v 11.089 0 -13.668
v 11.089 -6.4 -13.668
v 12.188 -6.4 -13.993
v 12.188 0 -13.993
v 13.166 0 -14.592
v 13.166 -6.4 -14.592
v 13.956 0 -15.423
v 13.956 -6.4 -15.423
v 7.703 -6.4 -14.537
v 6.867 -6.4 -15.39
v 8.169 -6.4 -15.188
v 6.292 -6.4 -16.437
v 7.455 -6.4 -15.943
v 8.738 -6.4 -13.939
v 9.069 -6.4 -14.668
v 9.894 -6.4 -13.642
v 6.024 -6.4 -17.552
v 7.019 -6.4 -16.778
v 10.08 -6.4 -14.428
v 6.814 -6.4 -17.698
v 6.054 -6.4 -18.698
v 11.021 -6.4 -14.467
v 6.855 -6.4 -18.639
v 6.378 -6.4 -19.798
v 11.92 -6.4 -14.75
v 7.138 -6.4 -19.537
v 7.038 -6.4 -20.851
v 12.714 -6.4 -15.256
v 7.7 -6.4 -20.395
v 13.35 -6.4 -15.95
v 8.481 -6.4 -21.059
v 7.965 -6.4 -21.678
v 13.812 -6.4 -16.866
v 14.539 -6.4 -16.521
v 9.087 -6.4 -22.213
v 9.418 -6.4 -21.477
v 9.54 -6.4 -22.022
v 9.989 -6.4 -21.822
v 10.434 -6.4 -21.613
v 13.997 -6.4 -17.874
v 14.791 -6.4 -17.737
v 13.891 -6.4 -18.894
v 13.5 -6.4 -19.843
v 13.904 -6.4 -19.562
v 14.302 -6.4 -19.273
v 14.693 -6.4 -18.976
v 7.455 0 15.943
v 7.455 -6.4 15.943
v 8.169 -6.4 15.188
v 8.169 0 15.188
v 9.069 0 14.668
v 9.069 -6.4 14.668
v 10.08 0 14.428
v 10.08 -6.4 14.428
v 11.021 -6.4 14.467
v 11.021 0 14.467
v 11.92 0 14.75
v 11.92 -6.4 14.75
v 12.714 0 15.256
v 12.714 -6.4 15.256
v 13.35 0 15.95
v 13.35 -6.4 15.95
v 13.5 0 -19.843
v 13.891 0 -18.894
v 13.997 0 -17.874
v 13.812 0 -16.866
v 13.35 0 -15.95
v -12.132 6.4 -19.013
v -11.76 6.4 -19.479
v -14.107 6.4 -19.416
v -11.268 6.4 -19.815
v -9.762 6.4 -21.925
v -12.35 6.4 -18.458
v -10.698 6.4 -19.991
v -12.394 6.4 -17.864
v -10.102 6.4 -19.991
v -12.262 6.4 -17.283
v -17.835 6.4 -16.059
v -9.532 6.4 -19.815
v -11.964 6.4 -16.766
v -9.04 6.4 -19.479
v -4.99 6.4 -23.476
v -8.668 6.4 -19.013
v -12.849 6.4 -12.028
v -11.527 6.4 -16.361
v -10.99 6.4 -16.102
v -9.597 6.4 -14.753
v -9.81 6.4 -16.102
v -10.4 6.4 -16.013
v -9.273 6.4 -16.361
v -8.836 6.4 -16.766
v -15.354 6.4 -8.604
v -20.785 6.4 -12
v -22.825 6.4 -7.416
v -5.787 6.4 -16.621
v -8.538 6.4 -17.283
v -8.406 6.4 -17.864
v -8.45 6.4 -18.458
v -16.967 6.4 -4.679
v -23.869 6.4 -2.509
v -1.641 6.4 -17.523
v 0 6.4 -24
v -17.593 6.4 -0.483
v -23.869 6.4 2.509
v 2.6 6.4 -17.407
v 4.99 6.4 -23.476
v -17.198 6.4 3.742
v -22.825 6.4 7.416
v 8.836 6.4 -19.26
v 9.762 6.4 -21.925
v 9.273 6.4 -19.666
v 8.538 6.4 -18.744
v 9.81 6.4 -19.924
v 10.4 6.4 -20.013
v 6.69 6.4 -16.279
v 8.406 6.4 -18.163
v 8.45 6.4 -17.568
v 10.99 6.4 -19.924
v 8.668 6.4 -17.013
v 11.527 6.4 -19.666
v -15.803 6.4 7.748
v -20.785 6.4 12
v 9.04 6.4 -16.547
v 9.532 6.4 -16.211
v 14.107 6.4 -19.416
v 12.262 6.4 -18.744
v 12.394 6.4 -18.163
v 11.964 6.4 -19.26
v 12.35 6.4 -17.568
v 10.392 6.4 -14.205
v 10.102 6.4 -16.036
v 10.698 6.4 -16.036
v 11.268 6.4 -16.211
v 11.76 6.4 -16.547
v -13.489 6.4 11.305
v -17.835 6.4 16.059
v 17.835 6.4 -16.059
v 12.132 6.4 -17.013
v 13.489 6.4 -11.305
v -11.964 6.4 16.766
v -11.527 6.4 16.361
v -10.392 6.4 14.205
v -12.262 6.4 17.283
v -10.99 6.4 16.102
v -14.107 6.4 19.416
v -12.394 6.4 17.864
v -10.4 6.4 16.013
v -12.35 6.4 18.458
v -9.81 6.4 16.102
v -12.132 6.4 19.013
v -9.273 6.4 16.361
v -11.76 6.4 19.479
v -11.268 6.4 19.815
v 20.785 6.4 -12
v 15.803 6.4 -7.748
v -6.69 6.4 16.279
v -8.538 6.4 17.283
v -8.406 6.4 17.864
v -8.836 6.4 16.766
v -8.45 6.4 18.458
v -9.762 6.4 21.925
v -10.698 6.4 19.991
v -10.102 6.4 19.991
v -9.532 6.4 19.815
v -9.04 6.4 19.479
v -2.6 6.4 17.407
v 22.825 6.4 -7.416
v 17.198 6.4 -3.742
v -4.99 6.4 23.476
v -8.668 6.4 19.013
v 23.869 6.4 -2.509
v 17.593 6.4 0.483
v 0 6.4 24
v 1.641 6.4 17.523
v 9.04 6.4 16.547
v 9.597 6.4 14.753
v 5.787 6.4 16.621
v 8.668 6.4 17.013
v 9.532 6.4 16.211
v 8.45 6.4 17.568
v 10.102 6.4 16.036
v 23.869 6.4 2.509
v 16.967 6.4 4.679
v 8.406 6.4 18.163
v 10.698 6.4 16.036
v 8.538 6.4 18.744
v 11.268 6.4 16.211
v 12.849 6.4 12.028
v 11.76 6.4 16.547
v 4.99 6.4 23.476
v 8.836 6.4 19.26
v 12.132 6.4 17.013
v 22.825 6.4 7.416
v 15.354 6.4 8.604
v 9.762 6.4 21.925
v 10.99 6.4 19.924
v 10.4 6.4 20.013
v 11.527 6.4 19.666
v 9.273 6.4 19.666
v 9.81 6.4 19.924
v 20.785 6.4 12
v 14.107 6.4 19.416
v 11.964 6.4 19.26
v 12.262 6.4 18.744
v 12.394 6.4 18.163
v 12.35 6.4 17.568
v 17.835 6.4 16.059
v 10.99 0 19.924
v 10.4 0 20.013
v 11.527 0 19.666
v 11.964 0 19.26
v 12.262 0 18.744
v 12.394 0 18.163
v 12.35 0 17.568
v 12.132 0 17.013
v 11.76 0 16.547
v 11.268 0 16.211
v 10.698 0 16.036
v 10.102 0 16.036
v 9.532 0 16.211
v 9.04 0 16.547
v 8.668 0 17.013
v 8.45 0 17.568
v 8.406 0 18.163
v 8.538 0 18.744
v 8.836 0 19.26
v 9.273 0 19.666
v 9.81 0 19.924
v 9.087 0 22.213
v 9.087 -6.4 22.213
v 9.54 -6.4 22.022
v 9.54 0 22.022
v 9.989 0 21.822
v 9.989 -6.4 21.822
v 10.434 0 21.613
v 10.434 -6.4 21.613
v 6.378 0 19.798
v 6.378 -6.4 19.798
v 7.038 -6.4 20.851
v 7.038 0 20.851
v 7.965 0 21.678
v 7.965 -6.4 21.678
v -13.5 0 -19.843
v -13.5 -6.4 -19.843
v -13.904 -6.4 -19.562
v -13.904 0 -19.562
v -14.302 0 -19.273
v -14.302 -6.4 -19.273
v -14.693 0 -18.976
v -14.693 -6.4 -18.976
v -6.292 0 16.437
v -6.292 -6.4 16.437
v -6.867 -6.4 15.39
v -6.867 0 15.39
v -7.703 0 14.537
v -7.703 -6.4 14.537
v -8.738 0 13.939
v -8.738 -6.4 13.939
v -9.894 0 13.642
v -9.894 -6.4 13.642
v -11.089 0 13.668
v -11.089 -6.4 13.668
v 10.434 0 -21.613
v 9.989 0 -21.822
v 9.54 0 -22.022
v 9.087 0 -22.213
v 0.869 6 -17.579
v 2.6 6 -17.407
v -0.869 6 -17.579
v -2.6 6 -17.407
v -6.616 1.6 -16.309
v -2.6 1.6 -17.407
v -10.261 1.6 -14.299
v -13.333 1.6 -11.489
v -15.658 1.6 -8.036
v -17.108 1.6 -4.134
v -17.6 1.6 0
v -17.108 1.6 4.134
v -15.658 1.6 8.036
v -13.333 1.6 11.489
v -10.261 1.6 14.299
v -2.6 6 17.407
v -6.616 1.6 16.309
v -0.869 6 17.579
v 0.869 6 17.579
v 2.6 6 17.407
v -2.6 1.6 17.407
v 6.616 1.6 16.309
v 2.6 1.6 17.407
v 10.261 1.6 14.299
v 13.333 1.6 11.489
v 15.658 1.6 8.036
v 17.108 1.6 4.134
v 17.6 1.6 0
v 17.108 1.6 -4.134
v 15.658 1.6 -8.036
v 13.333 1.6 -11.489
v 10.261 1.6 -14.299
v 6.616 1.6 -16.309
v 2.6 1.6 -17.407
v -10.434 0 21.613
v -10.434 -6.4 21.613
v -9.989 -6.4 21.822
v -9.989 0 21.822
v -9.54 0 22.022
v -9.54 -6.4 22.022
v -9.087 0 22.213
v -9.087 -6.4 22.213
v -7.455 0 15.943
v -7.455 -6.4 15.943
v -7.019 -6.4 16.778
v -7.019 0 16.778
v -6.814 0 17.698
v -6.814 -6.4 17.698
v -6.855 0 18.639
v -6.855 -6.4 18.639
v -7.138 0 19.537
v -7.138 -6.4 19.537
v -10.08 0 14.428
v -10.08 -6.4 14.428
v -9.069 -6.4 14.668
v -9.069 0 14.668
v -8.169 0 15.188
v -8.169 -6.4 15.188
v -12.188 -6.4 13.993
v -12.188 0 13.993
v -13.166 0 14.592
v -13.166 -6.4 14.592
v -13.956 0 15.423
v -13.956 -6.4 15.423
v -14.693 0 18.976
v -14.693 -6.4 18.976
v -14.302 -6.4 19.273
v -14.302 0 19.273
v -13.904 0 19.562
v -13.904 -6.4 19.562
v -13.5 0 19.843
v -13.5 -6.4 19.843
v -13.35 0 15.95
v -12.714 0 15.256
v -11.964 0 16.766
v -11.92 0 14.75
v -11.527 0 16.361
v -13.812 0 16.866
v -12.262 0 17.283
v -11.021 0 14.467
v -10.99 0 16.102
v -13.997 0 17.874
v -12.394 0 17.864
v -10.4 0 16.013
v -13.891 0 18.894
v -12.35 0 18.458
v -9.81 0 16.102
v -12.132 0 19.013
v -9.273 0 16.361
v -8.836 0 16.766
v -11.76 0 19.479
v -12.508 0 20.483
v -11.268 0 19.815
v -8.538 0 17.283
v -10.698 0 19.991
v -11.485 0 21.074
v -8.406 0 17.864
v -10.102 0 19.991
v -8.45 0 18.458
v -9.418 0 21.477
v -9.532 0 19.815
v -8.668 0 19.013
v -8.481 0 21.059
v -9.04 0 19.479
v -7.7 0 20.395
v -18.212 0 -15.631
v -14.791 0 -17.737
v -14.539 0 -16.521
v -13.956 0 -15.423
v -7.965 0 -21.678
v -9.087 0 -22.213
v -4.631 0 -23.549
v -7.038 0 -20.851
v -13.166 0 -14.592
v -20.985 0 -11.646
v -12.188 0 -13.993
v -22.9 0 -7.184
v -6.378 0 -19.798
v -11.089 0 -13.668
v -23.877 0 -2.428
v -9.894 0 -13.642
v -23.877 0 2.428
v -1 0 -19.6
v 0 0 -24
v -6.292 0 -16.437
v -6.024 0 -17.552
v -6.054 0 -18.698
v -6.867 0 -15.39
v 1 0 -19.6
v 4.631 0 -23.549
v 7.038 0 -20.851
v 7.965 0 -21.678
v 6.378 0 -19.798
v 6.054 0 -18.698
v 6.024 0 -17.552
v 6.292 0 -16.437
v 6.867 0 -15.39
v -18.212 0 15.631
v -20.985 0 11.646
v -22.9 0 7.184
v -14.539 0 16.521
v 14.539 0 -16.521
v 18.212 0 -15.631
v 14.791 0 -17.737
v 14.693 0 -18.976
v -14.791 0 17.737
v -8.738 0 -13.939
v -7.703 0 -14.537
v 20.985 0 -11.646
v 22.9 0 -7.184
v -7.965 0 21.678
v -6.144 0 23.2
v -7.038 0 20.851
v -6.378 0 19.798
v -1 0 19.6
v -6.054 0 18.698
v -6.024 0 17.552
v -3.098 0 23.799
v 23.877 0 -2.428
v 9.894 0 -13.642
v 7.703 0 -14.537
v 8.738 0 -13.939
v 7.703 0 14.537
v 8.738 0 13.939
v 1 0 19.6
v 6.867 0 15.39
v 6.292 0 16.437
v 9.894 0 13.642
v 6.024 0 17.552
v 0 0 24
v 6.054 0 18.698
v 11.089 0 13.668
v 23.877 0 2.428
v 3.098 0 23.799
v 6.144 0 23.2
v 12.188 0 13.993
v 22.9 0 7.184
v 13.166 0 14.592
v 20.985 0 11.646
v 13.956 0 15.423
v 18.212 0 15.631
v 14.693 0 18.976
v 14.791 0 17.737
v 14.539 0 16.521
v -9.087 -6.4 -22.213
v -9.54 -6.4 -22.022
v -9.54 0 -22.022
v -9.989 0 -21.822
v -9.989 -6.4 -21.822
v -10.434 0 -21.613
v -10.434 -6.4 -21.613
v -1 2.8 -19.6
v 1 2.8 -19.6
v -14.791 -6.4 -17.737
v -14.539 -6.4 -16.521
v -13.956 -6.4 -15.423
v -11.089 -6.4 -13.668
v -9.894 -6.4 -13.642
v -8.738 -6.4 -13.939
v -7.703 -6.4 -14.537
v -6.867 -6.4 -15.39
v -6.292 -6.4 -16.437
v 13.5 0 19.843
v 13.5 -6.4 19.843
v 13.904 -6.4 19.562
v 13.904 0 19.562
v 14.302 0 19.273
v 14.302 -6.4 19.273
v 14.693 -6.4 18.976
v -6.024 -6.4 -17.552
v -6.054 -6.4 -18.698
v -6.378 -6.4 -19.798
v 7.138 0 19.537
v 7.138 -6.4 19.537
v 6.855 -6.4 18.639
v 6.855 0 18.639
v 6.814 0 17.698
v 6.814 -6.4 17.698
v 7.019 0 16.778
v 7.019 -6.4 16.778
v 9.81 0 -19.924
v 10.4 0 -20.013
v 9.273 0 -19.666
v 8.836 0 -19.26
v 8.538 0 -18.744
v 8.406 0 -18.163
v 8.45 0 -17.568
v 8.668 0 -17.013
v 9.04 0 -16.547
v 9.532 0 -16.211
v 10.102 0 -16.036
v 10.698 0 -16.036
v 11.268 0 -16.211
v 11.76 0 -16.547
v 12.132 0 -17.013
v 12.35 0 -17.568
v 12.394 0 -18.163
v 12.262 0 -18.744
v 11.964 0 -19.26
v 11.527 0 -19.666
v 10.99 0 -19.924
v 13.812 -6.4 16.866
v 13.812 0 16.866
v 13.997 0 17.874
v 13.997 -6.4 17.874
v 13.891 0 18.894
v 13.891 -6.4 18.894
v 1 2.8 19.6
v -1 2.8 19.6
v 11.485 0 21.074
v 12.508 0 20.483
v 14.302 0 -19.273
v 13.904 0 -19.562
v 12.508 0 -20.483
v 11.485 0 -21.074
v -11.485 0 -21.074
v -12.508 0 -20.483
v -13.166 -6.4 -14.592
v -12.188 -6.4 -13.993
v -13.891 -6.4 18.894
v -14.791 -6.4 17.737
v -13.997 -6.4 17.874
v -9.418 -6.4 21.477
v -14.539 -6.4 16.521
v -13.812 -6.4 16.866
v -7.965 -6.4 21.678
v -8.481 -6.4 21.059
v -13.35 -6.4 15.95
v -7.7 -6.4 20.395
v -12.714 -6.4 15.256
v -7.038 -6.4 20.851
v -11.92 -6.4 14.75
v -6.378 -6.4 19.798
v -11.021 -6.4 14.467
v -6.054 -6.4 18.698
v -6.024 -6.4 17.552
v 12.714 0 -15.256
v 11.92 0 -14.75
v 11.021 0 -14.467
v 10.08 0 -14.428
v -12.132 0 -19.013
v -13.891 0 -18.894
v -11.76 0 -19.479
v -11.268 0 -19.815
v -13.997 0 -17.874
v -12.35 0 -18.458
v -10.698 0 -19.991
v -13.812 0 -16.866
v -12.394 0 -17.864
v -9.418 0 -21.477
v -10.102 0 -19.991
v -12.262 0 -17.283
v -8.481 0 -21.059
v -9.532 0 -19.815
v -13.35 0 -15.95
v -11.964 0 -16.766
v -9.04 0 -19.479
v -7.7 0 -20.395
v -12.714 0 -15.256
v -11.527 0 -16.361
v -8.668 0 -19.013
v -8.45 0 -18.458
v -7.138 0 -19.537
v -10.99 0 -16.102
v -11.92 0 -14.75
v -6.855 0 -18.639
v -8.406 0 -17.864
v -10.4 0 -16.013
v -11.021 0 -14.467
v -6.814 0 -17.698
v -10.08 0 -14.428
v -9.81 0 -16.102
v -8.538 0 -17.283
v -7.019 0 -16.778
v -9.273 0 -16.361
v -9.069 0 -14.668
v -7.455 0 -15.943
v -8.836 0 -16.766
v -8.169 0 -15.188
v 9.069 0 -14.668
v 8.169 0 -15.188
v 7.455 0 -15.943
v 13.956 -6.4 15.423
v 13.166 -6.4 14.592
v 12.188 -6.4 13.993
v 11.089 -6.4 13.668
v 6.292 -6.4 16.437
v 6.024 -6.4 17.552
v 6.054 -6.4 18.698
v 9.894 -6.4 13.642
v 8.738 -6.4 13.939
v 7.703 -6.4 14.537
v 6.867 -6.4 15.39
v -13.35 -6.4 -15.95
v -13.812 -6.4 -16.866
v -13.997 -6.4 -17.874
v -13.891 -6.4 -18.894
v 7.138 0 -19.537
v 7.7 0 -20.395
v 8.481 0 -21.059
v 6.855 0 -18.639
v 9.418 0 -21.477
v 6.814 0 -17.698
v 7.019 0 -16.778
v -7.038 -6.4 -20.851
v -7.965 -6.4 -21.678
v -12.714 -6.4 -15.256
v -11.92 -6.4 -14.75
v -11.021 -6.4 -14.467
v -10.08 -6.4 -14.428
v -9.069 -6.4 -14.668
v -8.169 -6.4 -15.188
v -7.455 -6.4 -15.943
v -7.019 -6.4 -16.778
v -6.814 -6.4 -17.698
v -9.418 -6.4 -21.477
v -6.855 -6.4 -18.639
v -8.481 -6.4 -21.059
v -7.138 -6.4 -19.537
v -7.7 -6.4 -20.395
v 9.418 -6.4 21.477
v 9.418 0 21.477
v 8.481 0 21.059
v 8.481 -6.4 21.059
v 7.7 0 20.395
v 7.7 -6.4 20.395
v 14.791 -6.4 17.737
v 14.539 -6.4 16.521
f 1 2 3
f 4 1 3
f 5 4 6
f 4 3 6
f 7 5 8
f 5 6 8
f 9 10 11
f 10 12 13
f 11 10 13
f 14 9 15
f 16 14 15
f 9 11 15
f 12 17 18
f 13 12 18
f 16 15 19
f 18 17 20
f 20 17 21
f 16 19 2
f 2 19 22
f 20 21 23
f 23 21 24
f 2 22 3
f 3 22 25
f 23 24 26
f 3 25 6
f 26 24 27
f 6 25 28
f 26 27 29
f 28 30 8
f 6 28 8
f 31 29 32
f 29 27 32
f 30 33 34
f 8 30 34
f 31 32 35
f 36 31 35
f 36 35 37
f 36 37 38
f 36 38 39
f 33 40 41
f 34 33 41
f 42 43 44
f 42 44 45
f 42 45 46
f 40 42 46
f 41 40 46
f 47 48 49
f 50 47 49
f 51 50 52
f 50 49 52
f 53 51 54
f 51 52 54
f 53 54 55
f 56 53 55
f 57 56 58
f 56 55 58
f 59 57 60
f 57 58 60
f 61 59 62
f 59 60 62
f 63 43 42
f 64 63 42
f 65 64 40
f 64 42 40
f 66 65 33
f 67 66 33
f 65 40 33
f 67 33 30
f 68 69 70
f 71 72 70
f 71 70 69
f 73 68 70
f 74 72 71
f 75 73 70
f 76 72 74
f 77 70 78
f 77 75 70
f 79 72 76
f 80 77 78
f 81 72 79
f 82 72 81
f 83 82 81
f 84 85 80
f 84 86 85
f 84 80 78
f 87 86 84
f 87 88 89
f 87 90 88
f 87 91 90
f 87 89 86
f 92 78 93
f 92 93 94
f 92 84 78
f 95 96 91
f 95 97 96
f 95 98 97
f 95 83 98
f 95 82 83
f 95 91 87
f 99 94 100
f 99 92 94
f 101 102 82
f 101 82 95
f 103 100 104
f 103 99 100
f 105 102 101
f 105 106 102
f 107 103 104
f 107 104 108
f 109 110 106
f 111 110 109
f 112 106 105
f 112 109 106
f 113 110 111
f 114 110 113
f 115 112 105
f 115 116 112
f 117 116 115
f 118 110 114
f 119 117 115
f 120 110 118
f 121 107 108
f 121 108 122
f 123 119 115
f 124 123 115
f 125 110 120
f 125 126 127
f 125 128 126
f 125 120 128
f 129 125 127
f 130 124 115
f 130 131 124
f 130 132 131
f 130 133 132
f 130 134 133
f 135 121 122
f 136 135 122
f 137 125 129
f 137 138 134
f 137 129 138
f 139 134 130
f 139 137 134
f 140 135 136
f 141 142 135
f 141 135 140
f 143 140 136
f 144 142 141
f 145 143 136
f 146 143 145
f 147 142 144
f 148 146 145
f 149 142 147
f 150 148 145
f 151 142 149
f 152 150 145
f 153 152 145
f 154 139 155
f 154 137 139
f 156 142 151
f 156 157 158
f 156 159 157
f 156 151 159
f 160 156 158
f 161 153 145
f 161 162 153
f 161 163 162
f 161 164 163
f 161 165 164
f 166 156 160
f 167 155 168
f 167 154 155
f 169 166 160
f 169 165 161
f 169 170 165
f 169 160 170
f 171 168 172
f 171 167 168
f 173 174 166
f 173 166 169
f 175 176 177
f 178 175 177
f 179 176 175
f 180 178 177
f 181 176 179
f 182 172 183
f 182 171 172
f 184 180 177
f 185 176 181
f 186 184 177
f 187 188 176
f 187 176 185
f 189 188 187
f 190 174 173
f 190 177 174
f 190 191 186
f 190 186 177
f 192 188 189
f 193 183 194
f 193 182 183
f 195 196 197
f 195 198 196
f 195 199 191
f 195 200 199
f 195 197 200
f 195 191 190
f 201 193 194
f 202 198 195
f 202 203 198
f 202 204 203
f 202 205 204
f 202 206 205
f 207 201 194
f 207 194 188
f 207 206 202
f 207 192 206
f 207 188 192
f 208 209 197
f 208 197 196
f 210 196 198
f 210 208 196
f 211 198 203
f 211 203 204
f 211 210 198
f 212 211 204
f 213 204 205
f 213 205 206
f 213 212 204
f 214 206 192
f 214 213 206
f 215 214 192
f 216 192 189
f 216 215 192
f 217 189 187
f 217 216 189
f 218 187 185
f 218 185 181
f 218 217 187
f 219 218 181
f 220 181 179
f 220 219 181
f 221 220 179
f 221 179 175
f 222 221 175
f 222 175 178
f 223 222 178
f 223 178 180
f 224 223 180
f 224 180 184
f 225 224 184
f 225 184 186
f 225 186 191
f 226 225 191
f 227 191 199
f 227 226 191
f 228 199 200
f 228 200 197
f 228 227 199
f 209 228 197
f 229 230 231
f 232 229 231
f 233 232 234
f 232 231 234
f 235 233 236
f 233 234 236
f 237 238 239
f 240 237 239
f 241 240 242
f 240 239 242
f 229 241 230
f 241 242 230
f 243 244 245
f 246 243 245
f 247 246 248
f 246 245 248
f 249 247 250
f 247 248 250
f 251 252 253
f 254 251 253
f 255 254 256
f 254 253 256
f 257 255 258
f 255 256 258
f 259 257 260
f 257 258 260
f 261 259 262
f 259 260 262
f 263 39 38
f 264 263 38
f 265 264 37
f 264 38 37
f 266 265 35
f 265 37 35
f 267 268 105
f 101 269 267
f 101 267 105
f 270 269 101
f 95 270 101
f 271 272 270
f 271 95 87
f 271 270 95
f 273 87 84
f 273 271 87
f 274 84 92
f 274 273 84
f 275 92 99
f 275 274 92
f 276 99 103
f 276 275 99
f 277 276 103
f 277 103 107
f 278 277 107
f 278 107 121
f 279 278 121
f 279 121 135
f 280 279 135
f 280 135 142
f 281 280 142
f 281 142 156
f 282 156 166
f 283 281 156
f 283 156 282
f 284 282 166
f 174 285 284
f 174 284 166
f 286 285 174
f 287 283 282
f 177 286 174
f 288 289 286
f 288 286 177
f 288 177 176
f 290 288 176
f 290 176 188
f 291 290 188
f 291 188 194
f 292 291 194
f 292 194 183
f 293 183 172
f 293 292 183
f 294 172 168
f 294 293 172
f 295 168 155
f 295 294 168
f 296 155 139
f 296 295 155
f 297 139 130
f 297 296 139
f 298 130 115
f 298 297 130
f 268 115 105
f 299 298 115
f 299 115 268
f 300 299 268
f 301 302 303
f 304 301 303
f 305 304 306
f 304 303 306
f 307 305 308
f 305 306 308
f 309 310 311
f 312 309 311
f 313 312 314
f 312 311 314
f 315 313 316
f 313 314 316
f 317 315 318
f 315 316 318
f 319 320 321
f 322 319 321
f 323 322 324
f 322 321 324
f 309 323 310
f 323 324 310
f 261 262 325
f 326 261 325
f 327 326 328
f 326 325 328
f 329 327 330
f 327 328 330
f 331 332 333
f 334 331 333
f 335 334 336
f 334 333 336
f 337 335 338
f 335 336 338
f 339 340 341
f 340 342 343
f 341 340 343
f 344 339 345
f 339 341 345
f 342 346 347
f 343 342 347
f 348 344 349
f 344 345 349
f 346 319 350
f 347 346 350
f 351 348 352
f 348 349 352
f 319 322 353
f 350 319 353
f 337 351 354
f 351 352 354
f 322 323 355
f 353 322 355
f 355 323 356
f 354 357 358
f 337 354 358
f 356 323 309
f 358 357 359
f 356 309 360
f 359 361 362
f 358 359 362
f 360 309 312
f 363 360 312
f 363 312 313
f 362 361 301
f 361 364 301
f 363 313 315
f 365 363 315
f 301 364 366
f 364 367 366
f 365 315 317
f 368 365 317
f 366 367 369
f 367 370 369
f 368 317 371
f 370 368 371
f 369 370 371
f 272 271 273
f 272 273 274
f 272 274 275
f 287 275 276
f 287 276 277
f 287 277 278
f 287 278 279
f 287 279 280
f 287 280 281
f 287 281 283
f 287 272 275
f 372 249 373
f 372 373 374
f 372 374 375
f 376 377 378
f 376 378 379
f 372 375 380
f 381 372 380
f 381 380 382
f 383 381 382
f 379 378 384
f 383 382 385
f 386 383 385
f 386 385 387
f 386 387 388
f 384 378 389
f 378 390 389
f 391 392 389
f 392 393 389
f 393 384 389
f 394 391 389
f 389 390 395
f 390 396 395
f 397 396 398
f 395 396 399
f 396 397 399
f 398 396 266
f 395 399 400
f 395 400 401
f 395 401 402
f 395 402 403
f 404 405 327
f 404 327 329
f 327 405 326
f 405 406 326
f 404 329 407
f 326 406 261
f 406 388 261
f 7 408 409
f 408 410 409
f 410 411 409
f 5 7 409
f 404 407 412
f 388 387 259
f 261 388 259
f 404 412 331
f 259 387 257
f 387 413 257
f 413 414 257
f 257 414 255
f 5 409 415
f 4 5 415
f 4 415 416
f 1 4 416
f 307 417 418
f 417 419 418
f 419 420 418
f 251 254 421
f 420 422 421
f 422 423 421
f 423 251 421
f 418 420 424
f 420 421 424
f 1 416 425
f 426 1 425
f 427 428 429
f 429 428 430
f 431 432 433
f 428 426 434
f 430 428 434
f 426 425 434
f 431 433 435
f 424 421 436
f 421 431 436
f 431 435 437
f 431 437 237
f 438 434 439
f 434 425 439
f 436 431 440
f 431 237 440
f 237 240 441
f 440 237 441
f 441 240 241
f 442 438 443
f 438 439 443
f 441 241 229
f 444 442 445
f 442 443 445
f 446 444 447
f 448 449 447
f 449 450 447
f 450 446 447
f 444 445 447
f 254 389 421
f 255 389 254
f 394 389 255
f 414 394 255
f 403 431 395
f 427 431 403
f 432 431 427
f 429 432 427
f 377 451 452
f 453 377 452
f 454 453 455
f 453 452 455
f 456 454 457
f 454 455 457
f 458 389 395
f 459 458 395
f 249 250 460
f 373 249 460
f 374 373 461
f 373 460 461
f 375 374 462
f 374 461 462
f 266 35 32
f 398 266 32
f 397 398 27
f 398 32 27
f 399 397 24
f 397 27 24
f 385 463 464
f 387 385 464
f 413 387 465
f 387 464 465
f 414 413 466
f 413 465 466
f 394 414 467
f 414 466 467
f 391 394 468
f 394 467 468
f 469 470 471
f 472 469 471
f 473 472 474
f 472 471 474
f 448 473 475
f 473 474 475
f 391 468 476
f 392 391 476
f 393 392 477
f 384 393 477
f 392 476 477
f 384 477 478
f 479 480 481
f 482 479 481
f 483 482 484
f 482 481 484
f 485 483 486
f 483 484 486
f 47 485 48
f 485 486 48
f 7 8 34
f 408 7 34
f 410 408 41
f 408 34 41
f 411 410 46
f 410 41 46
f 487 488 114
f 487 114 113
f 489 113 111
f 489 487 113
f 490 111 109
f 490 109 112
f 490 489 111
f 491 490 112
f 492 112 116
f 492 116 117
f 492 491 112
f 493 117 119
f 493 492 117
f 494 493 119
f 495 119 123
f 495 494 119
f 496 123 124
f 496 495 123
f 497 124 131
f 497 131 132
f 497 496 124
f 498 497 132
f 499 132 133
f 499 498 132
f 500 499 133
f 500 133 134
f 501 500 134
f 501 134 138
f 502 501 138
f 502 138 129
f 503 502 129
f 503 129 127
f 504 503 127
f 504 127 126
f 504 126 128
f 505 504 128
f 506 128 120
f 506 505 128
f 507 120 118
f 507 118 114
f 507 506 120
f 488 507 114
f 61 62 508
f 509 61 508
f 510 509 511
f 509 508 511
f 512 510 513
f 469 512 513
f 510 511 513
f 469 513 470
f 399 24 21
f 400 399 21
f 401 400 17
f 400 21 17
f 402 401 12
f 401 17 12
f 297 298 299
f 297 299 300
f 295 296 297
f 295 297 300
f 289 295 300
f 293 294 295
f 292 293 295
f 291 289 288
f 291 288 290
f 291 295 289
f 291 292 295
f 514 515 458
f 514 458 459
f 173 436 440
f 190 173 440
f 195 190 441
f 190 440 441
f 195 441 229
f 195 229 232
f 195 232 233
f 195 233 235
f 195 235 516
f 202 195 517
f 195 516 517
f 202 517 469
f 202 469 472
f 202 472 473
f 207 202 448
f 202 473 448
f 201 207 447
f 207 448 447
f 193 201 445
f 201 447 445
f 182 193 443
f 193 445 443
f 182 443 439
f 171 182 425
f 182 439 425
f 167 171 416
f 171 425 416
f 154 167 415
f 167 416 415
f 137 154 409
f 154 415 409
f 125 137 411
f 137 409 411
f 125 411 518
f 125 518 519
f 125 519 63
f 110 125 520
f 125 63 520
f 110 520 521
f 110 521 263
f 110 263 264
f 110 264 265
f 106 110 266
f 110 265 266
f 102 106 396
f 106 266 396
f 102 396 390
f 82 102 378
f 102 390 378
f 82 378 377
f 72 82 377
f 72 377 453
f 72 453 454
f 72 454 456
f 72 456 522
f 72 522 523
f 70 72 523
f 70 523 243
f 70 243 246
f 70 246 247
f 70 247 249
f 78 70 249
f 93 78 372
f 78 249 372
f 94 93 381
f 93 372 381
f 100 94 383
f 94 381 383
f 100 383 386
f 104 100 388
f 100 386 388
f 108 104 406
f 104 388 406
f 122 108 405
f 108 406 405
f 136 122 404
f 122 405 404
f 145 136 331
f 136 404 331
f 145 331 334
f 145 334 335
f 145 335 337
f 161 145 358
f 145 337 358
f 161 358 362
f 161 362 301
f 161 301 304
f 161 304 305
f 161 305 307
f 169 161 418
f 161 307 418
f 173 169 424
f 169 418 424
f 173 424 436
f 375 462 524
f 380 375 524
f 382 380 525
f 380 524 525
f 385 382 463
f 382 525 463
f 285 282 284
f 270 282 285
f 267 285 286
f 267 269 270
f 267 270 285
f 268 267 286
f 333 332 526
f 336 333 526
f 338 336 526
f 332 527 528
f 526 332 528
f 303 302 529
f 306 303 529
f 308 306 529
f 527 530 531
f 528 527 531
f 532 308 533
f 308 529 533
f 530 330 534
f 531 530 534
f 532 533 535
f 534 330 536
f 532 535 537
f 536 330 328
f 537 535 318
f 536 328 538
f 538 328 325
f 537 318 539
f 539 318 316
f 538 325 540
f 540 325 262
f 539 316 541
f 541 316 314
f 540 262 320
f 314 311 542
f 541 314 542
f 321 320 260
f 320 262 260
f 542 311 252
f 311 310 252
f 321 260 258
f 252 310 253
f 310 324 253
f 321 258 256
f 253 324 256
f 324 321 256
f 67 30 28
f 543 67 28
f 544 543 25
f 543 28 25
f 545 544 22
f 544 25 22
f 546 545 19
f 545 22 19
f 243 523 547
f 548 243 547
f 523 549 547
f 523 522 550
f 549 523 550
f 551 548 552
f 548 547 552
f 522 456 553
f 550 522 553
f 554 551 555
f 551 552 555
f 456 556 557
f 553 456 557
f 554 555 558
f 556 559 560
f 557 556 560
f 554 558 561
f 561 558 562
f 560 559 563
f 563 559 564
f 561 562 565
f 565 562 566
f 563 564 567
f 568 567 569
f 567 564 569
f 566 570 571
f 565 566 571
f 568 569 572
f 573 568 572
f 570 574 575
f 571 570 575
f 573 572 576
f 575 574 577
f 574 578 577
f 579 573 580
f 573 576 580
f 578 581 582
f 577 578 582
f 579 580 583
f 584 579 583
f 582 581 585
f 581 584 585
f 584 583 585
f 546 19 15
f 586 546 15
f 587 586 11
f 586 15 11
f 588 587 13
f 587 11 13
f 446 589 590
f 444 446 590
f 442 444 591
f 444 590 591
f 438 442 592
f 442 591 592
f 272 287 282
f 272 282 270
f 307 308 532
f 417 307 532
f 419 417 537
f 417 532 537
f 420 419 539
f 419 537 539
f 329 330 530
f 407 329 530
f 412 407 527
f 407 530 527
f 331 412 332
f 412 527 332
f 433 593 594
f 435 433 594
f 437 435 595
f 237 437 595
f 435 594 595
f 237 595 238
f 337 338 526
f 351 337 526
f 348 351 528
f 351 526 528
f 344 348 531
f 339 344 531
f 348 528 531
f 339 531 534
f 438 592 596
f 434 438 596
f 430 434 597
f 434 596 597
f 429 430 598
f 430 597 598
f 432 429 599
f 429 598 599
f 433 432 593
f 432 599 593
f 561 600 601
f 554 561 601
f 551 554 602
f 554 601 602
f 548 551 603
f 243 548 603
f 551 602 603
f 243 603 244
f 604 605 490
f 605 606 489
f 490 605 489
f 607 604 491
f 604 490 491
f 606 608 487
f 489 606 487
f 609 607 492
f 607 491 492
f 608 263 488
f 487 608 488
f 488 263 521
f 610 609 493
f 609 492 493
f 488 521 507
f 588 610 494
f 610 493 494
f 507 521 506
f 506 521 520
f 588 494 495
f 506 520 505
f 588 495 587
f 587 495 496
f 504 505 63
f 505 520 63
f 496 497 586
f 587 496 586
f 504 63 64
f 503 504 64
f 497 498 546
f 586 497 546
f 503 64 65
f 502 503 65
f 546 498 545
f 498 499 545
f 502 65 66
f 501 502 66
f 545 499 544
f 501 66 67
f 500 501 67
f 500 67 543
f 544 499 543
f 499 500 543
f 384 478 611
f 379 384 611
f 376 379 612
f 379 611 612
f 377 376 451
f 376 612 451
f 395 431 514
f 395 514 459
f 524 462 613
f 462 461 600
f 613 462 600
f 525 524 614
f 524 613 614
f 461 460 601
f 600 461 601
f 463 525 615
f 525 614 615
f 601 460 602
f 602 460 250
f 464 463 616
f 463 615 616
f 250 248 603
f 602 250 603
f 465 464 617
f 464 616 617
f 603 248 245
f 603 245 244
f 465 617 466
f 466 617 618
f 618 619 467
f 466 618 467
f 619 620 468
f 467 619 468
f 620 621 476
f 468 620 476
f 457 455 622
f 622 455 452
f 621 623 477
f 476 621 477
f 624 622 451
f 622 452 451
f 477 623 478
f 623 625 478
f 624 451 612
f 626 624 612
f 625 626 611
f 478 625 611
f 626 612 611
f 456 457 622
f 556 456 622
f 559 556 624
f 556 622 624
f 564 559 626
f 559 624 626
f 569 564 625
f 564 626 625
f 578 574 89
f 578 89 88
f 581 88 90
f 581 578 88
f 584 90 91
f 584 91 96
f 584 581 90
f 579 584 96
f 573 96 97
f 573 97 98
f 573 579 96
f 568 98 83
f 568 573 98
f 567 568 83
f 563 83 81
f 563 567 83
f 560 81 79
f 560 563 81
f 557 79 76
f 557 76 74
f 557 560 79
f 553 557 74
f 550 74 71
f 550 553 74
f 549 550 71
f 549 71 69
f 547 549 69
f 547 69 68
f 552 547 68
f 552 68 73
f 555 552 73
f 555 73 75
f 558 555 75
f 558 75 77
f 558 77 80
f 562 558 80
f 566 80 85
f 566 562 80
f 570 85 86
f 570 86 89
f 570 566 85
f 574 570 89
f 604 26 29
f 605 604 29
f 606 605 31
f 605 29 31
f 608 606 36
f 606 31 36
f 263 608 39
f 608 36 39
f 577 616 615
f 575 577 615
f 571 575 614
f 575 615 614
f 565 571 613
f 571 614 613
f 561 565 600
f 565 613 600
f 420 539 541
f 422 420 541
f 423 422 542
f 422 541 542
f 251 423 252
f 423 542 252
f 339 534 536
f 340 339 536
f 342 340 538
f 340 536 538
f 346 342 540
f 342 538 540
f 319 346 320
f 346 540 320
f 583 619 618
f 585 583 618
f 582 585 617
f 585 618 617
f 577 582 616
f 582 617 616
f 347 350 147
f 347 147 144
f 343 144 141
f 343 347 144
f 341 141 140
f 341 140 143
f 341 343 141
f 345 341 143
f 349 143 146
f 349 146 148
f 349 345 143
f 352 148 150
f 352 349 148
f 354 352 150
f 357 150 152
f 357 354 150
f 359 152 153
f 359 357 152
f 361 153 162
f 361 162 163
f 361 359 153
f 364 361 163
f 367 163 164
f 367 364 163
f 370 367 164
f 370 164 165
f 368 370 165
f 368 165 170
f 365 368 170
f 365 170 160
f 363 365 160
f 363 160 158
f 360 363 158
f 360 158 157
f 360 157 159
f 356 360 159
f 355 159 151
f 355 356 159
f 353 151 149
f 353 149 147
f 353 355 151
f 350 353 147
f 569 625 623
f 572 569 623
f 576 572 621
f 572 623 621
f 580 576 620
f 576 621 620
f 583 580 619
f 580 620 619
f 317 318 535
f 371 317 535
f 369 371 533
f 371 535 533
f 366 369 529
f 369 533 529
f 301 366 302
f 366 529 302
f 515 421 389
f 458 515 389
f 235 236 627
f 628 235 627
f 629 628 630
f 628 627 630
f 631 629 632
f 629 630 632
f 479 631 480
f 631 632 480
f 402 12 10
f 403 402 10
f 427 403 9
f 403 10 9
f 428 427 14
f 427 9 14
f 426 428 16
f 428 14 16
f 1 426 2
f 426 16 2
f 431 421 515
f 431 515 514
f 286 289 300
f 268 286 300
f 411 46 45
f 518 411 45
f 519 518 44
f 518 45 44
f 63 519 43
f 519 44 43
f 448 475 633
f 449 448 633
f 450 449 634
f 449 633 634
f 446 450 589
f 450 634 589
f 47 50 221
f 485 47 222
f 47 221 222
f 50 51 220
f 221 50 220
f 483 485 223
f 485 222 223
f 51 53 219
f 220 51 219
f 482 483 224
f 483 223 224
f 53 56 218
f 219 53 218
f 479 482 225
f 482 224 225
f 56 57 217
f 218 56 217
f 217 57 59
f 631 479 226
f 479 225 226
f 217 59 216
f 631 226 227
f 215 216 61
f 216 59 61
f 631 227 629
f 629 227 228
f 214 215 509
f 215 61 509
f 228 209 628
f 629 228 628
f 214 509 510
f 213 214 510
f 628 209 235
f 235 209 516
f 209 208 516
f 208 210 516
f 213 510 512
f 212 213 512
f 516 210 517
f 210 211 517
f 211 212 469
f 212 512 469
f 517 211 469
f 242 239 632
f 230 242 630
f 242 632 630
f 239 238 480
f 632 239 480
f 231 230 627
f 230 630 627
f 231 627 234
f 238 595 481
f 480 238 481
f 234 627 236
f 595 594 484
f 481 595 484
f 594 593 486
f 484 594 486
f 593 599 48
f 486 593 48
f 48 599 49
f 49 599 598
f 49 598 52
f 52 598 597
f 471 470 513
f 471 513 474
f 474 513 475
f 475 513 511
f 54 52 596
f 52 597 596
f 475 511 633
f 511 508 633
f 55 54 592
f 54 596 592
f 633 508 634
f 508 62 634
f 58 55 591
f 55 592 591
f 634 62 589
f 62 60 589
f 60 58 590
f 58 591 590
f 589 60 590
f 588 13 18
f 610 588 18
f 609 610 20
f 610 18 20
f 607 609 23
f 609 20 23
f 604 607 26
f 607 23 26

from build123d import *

# Parameters (mm, degrees)
SKETCH_1_R          = 17.6
EXTRUDE_1_DEPTH     = 1.6
SKETCH_1_4_W        = 5.2
SKETCH_1_4_H        = 42.4
EXTRUDE_2_DEPTH     = 6
SKETCH_1_7_R        = 24
SKETCH_1_7_R_2      = 17.6
SKETCH_1_7_R_3      = 2
EXTRUDE_3_DEPTH     = 6.4
EXTRUDE_START       = -6.4
EXTRUDE_4_DEPTH     = 6.4
SKETCH_1_5_W        = 2
SKETCH_1_5_H        = 39.2
CUT_EXTRUDE_1_DEPTH = 2.8


with BuildPart() as part:
    # 草圖1 → 填料-伸長1 (new body)
    with BuildSketch(Plane(origin=(0, 0, 0), x_dir=(1, 0, 0), z_dir=(0, 1, 0))):
        Circle(SKETCH_1_R)
    extrude(amount=EXTRUDE_1_DEPTH)

    # 草圖1<4> → 填料-伸長2 (add)
    with BuildSketch(Plane(origin=(0, 0, 0), x_dir=(1, 0, 0), z_dir=(0, 1, 0))):
        Rectangle(SKETCH_1_4_W, SKETCH_1_4_H)
    extrude(amount=EXTRUDE_2_DEPTH)

    # 草圖1<7> → 填料-伸長3 (add)
    with BuildSketch(Plane(origin=(0, 0, 0), x_dir=(1, 0, 0), z_dir=(0, 1, 0))):
        Circle(SKETCH_1_7_R)
        Circle(SKETCH_1_7_R_2, mode=Mode.SUBTRACT)
        with Locations((-10.4, 18.013328399)):
            Circle(SKETCH_1_7_R_3, mode=Mode.SUBTRACT)
        with Locations((10.4, 18.013328399)):
            Circle(SKETCH_1_7_R_3, mode=Mode.SUBTRACT)
        with Locations((10.4, -18.013328399)):
            Circle(SKETCH_1_7_R_3, mode=Mode.SUBTRACT)
        with Locations((-10.4, -18.013328399)):
            Circle(SKETCH_1_7_R_3, mode=Mode.SUBTRACT)
    extrude(amount=EXTRUDE_3_DEPTH)

    # 草圖1<9> → 填料-伸長4 (add)
    with BuildSketch(Plane(origin=(0, 0, 0), x_dir=(1, 0, 0), z_dir=(0, 1, 0)).offset(EXTRUDE_START)):
        with BuildLine():
            ThreePointArc((-13.500487327, 19.842803278), (-14.103540299, 19.418809207), (-14.693286878, 18.976493899))
            ThreePointArc((-14.693286878, 18.976493899), (-8.2, 14.202816622), (-9.087482353, 22.213006651))
            ThreePointArc((-9.087482353, 22.213006651), (-9.765411935, 21.923428786), (-10.434128057, 21.613166628))
            ThreePointArc((-10.434128057, 21.613166628), (-8.6, 14.895636945), (-13.500487327, 19.842803278))
        make_face()
        with BuildLine():
            ThreePointArc((14.693286878, 18.976493899), (14.103540299, 19.418809207), (13.500487327, 19.842803278))
            ThreePointArc((13.500487327, 19.842803278), (8.6, 14.895636945), (10.434128057, 21.613166628))
            ThreePointArc((10.434128057, 21.613166628), (9.765411935, 21.923428786), (9.087482353, 22.213006651))
            ThreePointArc((9.087482353, 22.213006651), (8.2, 14.202816622), (14.693286878, 18.976493899))
        make_face()
        with BuildLine():
            ThreePointArc((-14.693286878, -18.976493899), (-14.103540299, -19.418809207), (-13.500487327, -19.842803278))
            ThreePointArc((-13.500487327, -19.842803278), (-8.6, -14.895636945), (-10.434128057, -21.613166628))
            ThreePointArc((-10.434128057, -21.613166628), (-9.765411935, -21.923428786), (-9.087482353, -22.213006651))
            ThreePointArc((-9.087482353, -22.213006651), (-8.2, -14.202816622), (-14.693286878, -18.976493899))
        make_face()
        with BuildLine():
            ThreePointArc((9.087482353, -22.213006651), (9.765411935, -21.923428786), (10.434128057, -21.613166628))
            ThreePointArc((10.434128057, -21.613166628), (8.6, -14.895636945), (13.500487327, -19.842803278))
            ThreePointArc((13.500487327, -19.842803278), (14.103540299, -19.418809207), (14.693286878, -18.976493899))
            ThreePointArc((14.693286878, -18.976493899), (8.2, -14.202816622), (9.087482353, -22.213006651))
        make_face()
    extrude(amount=EXTRUDE_4_DEPTH)

    # 草圖1<5> → 除料-伸長1 (cut)
    with BuildSketch(Plane(origin=(0, 0, 0), x_dir=(1, 0, 0), z_dir=(0, 1, 0))):
        Rectangle(SKETCH_1_5_W, SKETCH_1_5_H)
    extrude(amount=CUT_EXTRUDE_1_DEPTH, mode=Mode.SUBTRACT)


solid = part.part
